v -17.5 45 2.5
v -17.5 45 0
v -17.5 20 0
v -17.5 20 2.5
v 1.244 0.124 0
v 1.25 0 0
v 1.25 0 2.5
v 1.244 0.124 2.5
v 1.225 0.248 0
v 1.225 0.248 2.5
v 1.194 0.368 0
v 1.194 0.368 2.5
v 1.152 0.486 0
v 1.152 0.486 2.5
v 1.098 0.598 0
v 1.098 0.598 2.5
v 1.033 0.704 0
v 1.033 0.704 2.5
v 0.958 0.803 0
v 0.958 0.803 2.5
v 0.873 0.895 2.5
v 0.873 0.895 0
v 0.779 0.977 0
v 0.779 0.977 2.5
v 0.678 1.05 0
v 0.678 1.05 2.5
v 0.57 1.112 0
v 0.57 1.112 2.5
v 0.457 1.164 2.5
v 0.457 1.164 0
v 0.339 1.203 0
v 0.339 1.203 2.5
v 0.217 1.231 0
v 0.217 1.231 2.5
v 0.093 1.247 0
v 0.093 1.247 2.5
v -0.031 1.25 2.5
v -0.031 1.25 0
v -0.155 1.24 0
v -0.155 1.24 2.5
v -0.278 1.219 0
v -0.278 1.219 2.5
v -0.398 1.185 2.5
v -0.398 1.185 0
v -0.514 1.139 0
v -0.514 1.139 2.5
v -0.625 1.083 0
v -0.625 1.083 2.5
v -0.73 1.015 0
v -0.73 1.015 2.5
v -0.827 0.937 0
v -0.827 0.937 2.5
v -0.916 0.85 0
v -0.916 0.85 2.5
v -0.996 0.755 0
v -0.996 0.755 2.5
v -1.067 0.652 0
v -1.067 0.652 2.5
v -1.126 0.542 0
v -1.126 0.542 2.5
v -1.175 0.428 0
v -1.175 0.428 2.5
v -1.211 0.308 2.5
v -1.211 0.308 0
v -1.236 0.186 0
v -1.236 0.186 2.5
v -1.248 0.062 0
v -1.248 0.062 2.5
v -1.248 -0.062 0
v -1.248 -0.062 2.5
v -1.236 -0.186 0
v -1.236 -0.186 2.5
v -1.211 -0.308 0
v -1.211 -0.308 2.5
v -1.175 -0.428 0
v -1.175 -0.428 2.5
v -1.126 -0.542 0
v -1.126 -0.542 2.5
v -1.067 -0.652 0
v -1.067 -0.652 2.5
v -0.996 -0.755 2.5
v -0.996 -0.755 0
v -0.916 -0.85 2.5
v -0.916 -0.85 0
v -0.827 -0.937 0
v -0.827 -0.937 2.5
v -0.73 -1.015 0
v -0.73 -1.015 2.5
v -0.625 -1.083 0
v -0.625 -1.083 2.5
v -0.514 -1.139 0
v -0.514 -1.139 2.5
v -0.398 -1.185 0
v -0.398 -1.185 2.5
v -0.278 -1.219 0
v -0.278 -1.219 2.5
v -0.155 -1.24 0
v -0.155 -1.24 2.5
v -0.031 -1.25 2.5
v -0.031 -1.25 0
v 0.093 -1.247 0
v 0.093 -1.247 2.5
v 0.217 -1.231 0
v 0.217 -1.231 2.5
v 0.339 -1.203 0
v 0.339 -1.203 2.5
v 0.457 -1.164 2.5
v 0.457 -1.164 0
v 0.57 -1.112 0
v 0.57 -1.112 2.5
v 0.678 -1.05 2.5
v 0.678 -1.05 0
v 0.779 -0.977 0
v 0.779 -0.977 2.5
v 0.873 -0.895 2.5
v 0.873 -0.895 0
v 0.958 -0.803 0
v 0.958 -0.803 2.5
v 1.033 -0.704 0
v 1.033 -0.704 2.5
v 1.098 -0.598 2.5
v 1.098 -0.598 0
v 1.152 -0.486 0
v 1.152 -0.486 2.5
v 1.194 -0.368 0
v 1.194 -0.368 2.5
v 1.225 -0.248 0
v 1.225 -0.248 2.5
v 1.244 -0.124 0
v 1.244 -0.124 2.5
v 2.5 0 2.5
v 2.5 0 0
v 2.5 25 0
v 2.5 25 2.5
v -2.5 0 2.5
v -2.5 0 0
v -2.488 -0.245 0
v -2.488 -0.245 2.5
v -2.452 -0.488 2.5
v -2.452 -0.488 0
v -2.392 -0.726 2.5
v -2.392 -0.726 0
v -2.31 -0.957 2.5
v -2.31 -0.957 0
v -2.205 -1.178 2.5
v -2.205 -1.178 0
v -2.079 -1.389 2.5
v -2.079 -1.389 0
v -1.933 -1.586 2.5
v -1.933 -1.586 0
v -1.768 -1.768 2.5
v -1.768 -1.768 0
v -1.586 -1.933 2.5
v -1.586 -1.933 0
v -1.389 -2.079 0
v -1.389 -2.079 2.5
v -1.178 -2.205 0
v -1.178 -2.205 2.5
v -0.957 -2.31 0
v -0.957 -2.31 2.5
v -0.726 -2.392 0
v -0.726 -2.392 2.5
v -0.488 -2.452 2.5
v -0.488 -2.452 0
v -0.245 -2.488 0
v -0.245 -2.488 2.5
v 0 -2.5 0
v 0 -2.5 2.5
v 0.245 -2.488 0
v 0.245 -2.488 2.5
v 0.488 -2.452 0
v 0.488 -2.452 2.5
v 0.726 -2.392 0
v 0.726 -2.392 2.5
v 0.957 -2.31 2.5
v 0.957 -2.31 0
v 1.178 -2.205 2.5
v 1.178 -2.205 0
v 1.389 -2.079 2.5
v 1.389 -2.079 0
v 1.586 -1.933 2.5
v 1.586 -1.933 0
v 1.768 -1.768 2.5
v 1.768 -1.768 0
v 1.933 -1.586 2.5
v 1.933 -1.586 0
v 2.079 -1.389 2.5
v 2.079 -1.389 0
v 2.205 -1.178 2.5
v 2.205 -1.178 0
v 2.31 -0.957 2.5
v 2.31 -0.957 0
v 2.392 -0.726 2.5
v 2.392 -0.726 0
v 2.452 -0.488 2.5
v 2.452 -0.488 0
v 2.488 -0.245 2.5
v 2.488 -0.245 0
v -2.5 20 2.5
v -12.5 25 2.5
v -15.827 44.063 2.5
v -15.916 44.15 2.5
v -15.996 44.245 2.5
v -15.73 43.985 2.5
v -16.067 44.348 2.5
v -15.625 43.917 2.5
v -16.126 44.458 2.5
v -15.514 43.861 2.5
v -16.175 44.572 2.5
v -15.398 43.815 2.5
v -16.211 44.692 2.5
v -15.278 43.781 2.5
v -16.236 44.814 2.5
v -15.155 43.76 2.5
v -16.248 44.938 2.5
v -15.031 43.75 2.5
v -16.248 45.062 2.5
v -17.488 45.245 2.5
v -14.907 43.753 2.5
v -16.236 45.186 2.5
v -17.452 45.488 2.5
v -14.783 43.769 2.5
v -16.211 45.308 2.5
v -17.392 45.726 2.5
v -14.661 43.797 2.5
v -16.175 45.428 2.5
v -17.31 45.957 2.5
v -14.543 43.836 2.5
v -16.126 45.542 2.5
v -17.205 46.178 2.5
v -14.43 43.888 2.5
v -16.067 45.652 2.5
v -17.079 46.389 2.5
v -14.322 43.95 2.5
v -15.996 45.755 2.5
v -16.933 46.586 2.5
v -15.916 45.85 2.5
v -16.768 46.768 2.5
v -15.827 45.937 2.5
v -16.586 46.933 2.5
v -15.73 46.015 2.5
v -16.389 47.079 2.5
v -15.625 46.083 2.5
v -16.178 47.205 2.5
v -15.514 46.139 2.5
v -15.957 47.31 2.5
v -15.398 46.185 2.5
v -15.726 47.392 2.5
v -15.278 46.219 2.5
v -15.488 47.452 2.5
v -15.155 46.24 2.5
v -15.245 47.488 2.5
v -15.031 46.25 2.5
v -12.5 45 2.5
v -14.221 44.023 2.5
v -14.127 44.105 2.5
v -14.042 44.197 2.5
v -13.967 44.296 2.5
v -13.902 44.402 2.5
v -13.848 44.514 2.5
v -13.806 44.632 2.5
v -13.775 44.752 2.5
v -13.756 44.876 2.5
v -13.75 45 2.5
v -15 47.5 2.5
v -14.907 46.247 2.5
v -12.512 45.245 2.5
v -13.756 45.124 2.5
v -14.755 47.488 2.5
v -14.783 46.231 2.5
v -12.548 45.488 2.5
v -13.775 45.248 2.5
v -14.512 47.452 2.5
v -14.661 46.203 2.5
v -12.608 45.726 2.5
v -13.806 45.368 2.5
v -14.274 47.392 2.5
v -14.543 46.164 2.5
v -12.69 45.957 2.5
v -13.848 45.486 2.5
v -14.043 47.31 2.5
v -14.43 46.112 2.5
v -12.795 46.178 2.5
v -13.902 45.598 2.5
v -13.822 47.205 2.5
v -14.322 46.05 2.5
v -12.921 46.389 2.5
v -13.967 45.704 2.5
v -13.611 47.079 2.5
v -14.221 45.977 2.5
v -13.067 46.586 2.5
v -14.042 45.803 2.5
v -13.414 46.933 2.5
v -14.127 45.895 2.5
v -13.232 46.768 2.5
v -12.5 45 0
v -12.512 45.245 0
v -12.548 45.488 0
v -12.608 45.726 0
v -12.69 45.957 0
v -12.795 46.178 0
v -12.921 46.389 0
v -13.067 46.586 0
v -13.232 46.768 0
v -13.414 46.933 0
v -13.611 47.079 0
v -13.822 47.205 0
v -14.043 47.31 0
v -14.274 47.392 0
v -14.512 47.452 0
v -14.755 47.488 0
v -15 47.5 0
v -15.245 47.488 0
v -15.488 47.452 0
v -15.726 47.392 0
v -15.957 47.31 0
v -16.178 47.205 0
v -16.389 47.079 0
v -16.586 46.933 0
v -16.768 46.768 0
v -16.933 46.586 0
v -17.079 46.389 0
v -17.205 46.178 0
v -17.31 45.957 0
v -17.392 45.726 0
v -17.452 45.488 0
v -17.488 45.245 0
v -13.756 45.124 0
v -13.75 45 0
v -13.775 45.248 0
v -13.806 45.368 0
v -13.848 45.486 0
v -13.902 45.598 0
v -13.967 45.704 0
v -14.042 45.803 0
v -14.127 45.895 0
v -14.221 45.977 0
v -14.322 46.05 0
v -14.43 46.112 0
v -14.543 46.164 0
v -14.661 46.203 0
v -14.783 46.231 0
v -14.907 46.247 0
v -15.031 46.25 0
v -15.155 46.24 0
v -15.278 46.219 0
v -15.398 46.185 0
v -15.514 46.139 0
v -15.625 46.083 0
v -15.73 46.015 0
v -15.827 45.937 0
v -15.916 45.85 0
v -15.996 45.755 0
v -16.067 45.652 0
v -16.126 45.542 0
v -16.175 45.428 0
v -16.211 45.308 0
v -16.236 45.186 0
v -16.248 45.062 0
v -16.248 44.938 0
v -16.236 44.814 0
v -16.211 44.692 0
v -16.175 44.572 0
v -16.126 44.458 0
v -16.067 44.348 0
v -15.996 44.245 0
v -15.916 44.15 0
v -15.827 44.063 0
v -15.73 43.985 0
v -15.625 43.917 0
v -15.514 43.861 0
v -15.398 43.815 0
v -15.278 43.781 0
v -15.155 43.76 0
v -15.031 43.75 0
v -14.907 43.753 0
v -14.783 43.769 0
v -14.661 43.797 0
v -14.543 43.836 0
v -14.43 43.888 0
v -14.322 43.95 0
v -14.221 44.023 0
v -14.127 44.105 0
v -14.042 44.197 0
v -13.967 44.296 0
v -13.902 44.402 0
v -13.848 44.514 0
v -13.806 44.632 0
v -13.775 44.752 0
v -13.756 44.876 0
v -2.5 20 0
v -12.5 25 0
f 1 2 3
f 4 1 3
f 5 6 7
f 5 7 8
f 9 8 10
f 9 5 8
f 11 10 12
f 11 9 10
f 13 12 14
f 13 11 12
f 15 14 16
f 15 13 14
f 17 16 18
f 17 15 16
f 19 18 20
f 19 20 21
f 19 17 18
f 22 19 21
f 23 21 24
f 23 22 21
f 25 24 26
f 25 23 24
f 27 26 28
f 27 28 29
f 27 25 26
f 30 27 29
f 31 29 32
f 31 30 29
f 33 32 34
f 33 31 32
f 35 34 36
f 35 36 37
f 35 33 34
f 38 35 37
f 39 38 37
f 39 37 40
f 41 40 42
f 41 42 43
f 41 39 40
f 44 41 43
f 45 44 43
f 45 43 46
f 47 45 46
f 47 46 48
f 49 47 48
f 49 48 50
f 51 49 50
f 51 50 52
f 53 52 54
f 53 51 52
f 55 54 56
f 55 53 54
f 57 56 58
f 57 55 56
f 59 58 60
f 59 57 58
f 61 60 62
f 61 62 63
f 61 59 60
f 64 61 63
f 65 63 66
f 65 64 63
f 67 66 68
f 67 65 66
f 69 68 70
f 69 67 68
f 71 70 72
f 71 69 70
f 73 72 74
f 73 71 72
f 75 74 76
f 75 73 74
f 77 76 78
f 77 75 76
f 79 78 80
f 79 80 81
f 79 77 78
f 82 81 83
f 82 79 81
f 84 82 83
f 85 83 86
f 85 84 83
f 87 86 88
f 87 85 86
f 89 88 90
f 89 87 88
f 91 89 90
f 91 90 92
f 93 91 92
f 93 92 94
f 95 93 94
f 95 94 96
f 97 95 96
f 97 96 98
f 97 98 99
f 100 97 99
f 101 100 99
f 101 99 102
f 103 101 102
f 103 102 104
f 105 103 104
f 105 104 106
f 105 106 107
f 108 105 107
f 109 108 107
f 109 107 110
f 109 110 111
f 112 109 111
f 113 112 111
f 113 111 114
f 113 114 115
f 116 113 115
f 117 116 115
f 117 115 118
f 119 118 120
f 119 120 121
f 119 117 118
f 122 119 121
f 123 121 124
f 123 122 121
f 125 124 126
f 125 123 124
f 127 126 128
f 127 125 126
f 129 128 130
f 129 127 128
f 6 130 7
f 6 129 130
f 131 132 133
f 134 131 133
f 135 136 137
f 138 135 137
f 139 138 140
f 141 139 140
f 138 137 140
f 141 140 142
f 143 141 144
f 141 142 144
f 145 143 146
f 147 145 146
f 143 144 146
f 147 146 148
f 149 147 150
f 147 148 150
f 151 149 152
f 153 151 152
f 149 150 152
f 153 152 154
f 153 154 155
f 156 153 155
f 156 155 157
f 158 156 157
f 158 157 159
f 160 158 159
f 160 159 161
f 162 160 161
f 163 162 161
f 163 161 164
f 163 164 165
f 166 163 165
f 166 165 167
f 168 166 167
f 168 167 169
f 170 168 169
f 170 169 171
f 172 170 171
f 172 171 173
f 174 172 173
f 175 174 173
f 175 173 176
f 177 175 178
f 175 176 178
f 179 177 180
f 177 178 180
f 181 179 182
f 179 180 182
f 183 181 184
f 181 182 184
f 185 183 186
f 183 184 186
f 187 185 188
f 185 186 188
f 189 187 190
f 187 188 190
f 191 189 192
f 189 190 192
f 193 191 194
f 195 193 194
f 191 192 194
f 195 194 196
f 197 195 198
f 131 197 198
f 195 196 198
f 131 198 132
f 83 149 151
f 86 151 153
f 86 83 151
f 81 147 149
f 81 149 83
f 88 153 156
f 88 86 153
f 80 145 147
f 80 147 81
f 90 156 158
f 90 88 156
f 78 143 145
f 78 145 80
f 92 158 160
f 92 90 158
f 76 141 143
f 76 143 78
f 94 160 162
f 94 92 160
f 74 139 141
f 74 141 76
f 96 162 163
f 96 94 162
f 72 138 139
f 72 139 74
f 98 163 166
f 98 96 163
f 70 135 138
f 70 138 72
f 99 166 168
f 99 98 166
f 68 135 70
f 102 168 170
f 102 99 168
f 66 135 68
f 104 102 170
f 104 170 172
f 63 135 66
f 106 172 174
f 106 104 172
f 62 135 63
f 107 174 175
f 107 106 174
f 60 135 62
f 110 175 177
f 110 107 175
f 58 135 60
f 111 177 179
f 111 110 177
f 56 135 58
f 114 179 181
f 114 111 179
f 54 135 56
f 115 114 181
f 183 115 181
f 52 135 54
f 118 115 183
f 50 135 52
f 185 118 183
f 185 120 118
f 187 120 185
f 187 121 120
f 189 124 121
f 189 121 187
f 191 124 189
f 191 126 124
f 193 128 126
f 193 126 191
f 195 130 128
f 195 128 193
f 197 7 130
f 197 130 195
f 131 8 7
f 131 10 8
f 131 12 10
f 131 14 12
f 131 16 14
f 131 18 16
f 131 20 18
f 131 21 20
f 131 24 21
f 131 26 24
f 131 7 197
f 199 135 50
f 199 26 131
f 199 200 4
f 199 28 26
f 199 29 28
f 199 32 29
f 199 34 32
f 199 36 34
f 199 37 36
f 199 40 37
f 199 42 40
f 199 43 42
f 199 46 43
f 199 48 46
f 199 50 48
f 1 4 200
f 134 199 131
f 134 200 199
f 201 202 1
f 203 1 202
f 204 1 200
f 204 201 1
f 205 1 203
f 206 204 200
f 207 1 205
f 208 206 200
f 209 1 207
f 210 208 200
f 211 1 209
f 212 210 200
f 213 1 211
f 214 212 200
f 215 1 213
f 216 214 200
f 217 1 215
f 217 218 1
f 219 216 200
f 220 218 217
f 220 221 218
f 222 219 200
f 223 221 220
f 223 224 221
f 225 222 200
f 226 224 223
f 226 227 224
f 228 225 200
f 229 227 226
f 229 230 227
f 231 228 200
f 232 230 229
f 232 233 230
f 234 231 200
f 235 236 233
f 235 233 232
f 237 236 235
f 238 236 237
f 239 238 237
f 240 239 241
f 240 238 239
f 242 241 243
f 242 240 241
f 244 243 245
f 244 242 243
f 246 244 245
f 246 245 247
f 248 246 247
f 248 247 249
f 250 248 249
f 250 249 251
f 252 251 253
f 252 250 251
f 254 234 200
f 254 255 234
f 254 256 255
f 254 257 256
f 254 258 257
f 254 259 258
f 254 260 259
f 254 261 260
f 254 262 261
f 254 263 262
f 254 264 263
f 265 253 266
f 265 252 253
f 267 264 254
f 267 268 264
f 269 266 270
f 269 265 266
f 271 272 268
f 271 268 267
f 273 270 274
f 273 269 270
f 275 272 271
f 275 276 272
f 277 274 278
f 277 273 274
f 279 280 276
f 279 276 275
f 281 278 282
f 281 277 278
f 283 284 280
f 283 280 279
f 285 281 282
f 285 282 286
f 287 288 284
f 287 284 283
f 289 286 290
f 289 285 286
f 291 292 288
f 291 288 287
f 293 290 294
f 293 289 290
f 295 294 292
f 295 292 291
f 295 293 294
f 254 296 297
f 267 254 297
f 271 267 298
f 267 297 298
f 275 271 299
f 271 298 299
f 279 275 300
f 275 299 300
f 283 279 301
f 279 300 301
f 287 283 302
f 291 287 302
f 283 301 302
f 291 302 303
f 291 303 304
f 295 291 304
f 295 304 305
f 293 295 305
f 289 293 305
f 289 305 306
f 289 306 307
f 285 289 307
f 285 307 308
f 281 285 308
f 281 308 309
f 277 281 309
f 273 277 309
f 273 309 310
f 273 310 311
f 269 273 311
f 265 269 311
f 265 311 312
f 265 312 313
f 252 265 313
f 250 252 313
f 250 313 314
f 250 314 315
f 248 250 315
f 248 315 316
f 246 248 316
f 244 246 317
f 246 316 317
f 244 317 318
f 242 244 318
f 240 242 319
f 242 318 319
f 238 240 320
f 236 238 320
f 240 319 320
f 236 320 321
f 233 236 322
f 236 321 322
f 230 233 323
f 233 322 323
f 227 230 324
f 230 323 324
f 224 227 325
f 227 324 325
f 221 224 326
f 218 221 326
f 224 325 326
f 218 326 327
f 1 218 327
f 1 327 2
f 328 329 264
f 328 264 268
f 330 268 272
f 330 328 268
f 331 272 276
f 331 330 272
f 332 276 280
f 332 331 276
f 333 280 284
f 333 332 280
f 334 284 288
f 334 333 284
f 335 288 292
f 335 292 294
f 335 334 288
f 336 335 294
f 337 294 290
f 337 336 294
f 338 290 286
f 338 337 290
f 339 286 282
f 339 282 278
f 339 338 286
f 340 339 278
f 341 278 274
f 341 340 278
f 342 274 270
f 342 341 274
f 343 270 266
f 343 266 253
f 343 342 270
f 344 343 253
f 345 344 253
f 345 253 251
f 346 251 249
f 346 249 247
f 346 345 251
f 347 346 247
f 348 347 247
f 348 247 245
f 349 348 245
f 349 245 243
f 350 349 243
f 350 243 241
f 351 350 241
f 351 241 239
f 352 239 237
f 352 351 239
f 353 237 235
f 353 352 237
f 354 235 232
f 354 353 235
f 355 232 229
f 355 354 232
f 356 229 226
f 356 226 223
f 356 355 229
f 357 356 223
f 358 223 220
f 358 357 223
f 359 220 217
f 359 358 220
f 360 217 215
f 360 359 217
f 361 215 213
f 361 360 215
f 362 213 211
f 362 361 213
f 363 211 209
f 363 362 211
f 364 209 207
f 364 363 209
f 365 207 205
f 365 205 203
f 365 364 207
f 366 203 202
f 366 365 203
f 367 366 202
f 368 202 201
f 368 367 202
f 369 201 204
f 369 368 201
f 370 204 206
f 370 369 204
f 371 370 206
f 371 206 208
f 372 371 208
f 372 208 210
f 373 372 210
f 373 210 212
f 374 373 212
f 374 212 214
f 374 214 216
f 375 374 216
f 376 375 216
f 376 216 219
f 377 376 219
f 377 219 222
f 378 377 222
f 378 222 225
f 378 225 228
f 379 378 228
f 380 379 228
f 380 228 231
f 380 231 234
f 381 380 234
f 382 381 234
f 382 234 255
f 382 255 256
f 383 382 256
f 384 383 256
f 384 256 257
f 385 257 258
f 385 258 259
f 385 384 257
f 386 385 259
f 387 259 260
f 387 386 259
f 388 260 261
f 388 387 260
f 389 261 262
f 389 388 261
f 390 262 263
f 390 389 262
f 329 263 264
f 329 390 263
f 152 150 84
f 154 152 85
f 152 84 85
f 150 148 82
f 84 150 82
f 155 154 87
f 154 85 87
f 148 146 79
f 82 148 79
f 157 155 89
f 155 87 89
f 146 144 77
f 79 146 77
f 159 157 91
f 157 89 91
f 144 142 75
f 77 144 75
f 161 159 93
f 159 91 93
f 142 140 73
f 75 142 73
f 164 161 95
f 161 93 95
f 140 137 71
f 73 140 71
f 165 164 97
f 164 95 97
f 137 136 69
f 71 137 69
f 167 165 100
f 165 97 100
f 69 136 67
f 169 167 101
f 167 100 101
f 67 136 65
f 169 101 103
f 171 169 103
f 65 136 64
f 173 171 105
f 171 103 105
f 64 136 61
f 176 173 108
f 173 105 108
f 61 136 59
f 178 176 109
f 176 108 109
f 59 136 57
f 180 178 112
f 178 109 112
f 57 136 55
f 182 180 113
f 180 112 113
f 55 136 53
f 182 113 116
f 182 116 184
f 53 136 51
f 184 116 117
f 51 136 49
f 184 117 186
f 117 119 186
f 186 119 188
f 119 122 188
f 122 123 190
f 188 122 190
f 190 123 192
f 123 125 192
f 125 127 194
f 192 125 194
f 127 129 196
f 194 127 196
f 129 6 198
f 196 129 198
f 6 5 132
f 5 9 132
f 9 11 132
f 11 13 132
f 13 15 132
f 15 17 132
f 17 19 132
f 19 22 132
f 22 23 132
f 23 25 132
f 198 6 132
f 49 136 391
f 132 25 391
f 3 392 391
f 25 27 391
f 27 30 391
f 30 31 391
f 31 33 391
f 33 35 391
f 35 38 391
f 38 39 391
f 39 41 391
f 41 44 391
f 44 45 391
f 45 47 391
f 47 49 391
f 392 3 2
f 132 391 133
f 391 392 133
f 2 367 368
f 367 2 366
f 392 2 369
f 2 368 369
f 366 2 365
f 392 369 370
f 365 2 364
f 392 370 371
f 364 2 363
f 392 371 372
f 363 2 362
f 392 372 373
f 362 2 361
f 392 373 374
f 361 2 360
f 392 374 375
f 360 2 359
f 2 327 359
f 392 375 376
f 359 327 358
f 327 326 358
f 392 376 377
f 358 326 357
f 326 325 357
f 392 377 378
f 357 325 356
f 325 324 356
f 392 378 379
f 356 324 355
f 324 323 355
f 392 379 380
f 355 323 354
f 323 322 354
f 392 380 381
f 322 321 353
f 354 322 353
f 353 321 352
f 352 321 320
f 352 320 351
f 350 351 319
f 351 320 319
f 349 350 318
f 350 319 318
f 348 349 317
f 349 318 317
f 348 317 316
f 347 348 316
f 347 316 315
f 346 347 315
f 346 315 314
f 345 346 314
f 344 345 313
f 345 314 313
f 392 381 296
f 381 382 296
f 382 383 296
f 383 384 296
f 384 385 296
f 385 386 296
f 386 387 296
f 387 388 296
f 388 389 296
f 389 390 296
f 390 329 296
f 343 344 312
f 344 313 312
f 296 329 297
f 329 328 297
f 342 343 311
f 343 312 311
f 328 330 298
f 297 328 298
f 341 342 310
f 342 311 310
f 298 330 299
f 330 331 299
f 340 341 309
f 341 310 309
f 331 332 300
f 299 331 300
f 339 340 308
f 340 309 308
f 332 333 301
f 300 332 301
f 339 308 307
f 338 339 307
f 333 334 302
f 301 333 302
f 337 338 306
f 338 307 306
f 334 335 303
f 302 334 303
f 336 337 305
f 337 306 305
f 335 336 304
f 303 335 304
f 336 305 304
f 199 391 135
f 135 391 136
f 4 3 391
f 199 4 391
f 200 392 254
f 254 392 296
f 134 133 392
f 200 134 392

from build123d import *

# Parameters (mm, degrees)
SKETCH2_R           = 2.5
SKETCH2_R_2         = 1.25
BOSS_EXTRUDE2_DEPTH = 2.5


with BuildPart() as part:
    # Sketch2 → Boss-Extrude2 (new body)
    # profile 1 of 3: a face of its own
    with BuildSketch(Plane.XY):
        with BuildLine():
            Line((-12.5, 25), (-12.5, 45))
            ThreePointArc((-12.5, 45), (-15, 42.5), (-17.5, 45))
            Line((-17.5, 45), (-17.5, 20))
            Line((-17.5, 20), (-2.5, 20))
            Line((-2.5, 20), (-2.5, 0))
            ThreePointArc((-2.5, 0), (0, 2.5), (2.5, 0))
            Line((2.5, 0), (2.5, 25))
            Line((2.5, 25), (-12.5, 25))
        make_face()
    # profile 2 of 3: a face of its own
    with BuildSketch(Plane.XY):
        with Locations((-15, 45)):
            Circle(SKETCH2_R)
        with Locations((-15, 45)):
            Circle(SKETCH2_R_2, mode=Mode.SUBTRACT)
    # profile 3 of 3: a face of its own
    with BuildSketch(Plane.XY):
        Circle(SKETCH2_R)
        Circle(SKETCH2_R_2, mode=Mode.SUBTRACT)
    extrude(amount=BOSS_EXTRUDE2_DEPTH)


solid = part.part
